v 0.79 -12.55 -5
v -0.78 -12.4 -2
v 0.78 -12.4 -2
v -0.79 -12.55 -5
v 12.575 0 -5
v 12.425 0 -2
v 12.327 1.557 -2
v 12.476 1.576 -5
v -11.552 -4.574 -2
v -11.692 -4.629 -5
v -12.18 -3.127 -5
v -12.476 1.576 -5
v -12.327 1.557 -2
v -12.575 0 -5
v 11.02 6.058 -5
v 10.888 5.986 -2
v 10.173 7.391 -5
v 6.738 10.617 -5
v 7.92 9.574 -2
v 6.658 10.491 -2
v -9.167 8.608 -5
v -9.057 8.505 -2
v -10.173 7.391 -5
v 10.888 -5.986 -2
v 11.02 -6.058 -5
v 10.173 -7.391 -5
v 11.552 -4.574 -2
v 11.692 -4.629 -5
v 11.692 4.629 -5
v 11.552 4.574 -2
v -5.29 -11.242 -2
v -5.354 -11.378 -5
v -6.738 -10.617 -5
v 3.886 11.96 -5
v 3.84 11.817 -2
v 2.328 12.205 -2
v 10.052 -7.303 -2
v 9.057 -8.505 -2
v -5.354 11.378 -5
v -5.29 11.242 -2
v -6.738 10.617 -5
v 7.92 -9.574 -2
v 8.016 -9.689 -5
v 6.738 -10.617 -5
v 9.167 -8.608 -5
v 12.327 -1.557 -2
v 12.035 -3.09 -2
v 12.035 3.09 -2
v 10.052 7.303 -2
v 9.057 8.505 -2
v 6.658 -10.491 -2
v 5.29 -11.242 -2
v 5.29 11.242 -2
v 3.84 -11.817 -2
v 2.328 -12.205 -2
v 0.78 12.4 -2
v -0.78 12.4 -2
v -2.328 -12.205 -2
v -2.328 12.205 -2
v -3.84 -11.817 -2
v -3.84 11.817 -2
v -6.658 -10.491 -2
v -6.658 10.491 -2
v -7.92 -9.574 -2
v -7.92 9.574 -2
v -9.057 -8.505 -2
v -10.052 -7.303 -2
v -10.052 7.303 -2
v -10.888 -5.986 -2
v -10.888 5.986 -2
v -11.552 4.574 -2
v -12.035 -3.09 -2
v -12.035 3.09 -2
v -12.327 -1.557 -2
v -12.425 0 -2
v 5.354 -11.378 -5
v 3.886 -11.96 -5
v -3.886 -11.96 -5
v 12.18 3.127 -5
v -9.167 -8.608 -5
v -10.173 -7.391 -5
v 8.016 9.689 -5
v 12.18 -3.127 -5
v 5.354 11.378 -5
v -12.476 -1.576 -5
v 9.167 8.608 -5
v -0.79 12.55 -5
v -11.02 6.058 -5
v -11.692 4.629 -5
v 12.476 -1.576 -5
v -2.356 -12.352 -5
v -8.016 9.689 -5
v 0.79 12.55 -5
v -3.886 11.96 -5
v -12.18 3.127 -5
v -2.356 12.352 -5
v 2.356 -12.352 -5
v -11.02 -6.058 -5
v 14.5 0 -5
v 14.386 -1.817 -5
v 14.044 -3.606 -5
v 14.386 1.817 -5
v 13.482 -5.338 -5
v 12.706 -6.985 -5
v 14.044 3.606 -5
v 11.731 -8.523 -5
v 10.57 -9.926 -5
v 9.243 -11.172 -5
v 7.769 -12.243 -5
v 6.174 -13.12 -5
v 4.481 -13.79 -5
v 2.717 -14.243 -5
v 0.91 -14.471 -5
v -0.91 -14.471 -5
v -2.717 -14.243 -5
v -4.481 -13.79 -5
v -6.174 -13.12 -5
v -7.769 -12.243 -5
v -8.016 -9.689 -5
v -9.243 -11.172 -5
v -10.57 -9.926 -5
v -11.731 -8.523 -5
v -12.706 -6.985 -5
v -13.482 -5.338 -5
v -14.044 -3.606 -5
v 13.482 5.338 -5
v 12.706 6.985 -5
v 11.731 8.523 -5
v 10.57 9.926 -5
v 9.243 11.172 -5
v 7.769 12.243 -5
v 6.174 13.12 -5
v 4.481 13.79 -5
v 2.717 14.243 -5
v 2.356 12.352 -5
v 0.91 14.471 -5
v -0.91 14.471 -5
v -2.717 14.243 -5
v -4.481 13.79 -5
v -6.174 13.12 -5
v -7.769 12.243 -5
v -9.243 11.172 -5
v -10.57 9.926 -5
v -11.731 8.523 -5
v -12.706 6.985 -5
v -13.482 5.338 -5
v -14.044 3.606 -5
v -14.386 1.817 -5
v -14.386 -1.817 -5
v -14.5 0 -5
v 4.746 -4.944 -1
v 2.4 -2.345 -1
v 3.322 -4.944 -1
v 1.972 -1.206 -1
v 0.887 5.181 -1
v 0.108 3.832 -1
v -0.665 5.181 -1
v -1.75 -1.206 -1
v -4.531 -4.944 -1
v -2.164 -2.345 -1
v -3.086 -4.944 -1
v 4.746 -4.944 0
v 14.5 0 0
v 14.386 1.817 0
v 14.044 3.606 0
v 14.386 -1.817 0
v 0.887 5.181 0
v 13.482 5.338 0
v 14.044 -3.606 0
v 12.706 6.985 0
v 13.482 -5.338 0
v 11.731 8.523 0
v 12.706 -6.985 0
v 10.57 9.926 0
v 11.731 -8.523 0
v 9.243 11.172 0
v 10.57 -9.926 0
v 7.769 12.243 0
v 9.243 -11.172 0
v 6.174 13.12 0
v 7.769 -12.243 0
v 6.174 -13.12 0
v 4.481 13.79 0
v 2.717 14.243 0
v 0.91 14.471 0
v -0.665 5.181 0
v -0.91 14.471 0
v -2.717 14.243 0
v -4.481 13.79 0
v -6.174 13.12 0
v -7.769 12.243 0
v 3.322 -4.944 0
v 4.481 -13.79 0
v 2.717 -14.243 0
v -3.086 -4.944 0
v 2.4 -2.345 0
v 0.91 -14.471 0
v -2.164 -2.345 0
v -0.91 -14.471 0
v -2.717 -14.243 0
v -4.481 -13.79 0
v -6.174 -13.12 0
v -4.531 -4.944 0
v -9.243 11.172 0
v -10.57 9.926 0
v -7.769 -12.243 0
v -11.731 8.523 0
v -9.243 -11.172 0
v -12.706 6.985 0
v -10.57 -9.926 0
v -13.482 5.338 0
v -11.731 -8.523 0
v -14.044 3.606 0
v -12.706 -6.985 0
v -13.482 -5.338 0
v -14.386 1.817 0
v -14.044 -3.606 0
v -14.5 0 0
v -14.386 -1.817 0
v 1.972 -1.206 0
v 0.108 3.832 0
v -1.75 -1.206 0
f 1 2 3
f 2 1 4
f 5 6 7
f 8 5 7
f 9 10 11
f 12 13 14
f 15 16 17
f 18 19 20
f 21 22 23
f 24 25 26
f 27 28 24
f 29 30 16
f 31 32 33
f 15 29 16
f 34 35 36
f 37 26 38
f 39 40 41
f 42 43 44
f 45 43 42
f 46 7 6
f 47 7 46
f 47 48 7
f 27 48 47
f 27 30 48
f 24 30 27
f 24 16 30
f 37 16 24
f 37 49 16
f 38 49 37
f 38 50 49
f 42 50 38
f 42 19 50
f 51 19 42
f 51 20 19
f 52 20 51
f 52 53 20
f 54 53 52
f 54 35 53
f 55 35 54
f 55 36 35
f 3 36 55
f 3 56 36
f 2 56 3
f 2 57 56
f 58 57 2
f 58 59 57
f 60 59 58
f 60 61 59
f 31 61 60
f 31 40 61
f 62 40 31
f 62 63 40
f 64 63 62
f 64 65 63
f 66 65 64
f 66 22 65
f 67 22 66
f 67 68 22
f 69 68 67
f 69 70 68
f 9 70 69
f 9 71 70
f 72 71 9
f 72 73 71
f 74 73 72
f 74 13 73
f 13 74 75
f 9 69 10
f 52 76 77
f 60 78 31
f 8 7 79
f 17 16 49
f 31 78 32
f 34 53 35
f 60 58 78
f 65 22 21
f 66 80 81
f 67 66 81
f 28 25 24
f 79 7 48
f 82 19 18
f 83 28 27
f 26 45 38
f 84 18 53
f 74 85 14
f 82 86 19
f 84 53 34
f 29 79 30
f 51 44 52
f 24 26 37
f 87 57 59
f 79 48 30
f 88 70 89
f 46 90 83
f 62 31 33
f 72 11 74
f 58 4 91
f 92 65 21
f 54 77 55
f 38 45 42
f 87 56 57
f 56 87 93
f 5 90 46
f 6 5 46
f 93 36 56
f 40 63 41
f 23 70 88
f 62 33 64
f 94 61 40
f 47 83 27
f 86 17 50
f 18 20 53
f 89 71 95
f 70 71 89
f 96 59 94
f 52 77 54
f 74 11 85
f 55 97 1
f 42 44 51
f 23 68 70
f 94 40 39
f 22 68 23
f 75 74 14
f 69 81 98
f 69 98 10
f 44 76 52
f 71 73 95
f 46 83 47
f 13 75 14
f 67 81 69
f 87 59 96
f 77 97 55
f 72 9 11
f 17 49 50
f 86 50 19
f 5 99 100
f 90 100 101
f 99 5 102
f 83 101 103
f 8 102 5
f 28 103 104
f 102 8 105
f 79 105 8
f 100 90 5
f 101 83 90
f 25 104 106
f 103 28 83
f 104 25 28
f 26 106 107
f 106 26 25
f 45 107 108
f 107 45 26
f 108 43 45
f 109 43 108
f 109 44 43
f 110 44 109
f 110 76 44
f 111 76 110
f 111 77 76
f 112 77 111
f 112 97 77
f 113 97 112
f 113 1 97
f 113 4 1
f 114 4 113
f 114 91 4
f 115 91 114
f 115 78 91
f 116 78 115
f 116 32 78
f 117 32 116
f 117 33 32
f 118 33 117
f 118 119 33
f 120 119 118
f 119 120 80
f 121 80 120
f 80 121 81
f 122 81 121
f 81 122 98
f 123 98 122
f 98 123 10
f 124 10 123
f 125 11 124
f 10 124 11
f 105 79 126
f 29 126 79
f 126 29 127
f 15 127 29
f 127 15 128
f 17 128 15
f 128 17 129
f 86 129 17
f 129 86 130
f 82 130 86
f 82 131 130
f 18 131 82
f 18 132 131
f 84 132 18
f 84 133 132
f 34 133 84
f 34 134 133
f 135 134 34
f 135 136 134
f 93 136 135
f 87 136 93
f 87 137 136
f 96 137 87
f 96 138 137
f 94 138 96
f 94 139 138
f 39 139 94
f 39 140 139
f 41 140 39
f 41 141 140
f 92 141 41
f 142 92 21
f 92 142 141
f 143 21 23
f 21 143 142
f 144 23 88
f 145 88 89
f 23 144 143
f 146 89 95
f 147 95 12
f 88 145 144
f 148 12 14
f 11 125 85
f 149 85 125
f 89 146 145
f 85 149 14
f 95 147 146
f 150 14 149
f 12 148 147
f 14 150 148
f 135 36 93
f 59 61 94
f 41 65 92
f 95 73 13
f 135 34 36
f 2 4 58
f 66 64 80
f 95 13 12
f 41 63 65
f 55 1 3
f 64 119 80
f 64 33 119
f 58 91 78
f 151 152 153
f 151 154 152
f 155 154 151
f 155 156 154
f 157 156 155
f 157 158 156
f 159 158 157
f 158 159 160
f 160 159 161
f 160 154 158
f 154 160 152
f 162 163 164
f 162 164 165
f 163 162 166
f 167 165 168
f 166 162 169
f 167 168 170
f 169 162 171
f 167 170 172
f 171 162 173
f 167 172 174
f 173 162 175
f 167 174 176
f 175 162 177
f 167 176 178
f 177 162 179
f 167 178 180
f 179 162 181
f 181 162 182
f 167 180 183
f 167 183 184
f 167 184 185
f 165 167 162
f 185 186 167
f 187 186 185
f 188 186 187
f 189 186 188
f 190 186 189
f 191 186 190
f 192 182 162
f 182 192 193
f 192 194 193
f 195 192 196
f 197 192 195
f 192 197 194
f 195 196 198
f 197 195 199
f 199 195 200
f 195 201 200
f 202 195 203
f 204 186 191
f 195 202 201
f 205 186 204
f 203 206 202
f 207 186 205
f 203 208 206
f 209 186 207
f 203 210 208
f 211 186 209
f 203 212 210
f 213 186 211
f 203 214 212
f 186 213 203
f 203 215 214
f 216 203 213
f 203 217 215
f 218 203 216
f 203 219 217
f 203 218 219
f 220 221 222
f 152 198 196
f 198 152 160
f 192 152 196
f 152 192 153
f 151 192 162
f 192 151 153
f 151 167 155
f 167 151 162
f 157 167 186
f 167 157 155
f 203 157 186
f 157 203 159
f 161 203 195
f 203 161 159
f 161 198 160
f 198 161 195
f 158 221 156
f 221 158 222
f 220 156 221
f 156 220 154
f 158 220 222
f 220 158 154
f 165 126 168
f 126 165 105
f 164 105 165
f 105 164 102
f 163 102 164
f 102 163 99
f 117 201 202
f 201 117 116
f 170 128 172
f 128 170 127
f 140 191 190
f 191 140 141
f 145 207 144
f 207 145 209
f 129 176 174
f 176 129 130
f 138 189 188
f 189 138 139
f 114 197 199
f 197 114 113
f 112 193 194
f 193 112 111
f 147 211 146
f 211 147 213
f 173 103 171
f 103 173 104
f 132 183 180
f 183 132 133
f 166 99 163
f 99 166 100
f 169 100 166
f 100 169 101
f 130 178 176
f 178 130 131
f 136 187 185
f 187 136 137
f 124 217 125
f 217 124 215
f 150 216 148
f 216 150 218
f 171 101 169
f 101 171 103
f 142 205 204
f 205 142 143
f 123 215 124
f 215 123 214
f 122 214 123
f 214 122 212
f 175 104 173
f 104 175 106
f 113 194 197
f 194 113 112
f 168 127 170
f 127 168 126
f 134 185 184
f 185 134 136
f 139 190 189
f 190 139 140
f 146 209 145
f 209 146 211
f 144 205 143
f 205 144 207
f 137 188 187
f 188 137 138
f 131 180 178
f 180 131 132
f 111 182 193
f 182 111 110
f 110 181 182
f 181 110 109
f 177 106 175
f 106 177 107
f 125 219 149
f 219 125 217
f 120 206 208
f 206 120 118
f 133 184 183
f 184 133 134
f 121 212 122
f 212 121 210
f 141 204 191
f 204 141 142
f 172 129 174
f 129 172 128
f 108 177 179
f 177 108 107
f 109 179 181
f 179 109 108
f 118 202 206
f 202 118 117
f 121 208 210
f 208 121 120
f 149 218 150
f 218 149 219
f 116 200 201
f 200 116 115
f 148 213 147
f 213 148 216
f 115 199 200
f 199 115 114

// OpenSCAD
$fn = 50;

difference() {
	union() {
		translate(v = [0, 0, -5.0]) {
			cylinder(h = 5, r = 14.5);
		}
	}
	union() {
		#translate(v = [0, 0, -5.0]) {
			cylinder(h = 3, r1 = 12.575, r2 = 12.425);
		}
		translate(v = [0, 0, -1]) {
			linear_extrude(height = 1) {
				text(font = "Impact", halign = "center", size = 10, text = "A", valign = "center");
			}
		}
	}
}
